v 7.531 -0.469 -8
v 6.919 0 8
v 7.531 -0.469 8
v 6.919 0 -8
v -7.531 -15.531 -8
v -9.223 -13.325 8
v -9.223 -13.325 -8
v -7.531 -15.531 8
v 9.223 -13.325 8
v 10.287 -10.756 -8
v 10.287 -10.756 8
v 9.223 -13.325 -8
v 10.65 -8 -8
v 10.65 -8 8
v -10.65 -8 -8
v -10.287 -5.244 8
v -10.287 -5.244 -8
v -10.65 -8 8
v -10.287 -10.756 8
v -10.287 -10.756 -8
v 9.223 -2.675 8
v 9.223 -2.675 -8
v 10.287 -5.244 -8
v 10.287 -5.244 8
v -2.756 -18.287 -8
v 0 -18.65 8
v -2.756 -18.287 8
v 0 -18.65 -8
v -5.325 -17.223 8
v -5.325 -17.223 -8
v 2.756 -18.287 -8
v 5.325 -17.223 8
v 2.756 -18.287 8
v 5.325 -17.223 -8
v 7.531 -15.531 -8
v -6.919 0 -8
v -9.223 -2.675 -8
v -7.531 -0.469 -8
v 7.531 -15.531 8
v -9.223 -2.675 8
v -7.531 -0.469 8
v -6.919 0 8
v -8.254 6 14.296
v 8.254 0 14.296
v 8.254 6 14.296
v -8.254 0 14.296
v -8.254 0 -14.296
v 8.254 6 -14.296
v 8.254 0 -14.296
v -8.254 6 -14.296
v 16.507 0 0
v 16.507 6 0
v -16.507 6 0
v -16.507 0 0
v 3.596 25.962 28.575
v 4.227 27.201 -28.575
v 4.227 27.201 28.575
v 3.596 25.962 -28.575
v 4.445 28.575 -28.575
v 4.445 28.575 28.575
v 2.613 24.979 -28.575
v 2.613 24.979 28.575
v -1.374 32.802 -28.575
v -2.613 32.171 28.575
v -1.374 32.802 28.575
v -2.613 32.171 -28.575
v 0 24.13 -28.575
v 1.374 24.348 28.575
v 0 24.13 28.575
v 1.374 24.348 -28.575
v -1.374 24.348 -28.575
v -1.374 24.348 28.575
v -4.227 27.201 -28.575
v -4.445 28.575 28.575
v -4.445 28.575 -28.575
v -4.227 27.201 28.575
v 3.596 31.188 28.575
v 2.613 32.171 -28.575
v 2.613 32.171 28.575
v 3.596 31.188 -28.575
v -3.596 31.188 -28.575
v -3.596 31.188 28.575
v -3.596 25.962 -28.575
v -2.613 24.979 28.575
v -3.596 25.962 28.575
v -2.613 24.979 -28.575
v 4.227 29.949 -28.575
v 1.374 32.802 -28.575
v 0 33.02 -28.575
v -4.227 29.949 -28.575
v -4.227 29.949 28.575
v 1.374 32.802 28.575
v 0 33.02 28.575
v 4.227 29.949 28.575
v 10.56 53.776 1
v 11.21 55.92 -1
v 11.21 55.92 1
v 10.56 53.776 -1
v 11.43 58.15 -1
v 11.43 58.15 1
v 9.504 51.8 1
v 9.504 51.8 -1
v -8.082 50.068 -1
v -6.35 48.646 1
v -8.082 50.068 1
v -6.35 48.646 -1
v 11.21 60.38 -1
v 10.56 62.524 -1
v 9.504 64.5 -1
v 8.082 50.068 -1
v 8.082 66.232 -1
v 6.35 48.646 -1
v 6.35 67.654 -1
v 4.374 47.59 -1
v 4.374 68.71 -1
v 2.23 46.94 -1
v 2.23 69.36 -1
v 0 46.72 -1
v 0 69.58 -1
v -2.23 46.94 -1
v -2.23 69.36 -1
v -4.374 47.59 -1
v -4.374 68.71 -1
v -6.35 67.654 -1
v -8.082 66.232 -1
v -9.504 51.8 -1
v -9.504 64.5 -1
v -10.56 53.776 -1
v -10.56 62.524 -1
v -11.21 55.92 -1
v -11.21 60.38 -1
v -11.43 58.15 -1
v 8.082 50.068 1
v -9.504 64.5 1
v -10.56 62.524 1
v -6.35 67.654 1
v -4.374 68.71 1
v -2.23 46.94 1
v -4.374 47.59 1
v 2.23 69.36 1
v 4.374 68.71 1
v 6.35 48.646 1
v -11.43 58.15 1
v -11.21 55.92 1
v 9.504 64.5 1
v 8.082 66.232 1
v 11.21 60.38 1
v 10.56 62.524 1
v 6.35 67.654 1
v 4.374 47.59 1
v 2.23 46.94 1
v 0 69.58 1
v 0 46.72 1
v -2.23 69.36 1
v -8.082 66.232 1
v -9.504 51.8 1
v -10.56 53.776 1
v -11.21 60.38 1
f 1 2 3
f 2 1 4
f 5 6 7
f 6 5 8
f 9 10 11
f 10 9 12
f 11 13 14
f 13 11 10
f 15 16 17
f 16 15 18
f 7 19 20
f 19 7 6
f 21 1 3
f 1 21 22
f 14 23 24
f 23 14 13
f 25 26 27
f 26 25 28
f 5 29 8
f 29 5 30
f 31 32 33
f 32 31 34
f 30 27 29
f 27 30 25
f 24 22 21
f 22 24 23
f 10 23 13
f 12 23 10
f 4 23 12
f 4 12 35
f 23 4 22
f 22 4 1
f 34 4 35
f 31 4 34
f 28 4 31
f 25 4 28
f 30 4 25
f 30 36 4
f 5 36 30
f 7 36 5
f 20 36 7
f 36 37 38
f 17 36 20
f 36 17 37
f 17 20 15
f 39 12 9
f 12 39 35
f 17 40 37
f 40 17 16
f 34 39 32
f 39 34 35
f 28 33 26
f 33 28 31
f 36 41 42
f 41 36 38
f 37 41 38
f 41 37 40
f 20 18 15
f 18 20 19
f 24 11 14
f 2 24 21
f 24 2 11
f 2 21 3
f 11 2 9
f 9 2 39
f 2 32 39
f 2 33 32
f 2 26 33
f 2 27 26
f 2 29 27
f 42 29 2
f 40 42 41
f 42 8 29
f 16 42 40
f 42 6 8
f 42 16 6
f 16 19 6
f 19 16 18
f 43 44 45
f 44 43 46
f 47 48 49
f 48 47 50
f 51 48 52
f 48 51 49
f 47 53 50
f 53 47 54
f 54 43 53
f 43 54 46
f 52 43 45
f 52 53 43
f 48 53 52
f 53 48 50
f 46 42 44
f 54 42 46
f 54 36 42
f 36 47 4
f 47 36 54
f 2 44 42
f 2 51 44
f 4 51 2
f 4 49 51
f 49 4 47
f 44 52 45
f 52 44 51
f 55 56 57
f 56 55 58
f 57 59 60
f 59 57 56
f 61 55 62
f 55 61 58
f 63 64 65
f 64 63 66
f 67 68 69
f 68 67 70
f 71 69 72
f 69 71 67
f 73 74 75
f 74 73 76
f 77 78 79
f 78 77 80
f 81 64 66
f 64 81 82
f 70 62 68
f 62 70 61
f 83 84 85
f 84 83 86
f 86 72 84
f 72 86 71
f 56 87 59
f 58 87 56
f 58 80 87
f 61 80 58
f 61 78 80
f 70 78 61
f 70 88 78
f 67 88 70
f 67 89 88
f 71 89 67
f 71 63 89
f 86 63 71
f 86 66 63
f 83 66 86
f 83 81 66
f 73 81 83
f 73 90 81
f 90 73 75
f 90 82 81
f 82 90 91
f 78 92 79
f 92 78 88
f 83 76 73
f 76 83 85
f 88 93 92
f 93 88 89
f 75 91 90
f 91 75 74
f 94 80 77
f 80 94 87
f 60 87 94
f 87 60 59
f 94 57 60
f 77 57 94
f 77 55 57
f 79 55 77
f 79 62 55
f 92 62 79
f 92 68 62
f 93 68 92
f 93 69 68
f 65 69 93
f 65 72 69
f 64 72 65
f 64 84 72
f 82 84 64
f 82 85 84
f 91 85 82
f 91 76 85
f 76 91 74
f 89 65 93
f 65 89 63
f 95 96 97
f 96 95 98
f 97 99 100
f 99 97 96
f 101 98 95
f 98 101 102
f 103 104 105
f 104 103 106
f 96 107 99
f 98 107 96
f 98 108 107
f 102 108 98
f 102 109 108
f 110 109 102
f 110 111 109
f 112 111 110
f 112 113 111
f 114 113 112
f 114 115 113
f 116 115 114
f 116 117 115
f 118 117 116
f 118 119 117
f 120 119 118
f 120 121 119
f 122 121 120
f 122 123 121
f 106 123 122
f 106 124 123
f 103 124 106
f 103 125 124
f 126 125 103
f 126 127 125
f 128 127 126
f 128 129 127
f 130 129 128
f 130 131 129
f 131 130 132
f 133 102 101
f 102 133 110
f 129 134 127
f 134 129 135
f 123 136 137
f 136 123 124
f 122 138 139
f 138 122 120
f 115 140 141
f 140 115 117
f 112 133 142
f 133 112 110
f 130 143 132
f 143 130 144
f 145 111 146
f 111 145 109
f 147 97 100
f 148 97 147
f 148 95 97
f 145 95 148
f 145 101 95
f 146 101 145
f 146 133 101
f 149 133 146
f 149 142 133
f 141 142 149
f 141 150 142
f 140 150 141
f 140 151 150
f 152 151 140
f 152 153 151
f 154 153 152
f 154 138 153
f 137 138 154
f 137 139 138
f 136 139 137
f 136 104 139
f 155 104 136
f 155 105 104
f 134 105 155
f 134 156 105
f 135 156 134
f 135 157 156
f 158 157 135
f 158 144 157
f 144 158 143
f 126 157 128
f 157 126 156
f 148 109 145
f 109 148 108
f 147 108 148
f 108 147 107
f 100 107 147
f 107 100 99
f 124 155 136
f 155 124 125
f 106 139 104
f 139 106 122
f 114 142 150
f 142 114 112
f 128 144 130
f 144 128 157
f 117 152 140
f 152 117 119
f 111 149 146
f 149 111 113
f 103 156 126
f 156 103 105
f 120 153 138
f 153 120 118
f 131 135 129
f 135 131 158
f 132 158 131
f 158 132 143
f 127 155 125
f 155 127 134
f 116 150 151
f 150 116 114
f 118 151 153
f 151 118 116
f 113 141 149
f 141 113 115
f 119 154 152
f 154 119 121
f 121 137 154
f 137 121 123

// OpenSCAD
// Auto-generated by scripts/author_from_manifest.py (Phase D.3).
// Source: data/phase_d_manifest.json (sku_intent='reliable-f180-upright-155f').
// Do not hand-edit — regenerate from the manifest.
//
// @part reliable_f180_upright_155f
// @kind sprinkler_head
// @category head.upright.k80
// @display-name "Reliable F1-80 Upright K8.0 SR 155°F"
// @mfg reliable_automatic_sprinkler
// @mfg-pn F1-80
// @listing UL FM
// @hazard-classes OH1 OH2
// @price-usd 16.10
// @install-minutes 8
// @crew journeyman
// @k-factor 8
// @orientation upright
// @response standard
// @temperature 155F
// @param size_in number default=0.5 label="Size" unit="in"
// @port inlet position=[0,0.014,0] direction=[0,1,0] style=NPT_threaded size_in=0.5 role=drop

size_in = 0.5;
k_factor = 8.0;

length_mm   = 57.15;
body_dia_mm = 25.40;
thread_od   = 21.3;
thread_len  = 16;
deflector_d = body_dia_mm * 0.9;

rotate([180,0,0]) union() {
    translate([0, thread_len/2, 0])
        cylinder(h = thread_len, d = thread_od, center = true, $fn = 24);
    translate([0, -3, 0])
        rotate([90, 0, 0])
        cylinder(h = 6, d = thread_od * 1.55, $fn = 6, center = true);
    translate([0, -length_mm/2, 0])
        cylinder(h = length_mm, d = body_dia_mm * 0.35, center = true, $fn = 20);
    translate([0, -length_mm - 1, 0])
        cylinder(h = 2, d = deflector_d, center = true, $fn = 32);
}
